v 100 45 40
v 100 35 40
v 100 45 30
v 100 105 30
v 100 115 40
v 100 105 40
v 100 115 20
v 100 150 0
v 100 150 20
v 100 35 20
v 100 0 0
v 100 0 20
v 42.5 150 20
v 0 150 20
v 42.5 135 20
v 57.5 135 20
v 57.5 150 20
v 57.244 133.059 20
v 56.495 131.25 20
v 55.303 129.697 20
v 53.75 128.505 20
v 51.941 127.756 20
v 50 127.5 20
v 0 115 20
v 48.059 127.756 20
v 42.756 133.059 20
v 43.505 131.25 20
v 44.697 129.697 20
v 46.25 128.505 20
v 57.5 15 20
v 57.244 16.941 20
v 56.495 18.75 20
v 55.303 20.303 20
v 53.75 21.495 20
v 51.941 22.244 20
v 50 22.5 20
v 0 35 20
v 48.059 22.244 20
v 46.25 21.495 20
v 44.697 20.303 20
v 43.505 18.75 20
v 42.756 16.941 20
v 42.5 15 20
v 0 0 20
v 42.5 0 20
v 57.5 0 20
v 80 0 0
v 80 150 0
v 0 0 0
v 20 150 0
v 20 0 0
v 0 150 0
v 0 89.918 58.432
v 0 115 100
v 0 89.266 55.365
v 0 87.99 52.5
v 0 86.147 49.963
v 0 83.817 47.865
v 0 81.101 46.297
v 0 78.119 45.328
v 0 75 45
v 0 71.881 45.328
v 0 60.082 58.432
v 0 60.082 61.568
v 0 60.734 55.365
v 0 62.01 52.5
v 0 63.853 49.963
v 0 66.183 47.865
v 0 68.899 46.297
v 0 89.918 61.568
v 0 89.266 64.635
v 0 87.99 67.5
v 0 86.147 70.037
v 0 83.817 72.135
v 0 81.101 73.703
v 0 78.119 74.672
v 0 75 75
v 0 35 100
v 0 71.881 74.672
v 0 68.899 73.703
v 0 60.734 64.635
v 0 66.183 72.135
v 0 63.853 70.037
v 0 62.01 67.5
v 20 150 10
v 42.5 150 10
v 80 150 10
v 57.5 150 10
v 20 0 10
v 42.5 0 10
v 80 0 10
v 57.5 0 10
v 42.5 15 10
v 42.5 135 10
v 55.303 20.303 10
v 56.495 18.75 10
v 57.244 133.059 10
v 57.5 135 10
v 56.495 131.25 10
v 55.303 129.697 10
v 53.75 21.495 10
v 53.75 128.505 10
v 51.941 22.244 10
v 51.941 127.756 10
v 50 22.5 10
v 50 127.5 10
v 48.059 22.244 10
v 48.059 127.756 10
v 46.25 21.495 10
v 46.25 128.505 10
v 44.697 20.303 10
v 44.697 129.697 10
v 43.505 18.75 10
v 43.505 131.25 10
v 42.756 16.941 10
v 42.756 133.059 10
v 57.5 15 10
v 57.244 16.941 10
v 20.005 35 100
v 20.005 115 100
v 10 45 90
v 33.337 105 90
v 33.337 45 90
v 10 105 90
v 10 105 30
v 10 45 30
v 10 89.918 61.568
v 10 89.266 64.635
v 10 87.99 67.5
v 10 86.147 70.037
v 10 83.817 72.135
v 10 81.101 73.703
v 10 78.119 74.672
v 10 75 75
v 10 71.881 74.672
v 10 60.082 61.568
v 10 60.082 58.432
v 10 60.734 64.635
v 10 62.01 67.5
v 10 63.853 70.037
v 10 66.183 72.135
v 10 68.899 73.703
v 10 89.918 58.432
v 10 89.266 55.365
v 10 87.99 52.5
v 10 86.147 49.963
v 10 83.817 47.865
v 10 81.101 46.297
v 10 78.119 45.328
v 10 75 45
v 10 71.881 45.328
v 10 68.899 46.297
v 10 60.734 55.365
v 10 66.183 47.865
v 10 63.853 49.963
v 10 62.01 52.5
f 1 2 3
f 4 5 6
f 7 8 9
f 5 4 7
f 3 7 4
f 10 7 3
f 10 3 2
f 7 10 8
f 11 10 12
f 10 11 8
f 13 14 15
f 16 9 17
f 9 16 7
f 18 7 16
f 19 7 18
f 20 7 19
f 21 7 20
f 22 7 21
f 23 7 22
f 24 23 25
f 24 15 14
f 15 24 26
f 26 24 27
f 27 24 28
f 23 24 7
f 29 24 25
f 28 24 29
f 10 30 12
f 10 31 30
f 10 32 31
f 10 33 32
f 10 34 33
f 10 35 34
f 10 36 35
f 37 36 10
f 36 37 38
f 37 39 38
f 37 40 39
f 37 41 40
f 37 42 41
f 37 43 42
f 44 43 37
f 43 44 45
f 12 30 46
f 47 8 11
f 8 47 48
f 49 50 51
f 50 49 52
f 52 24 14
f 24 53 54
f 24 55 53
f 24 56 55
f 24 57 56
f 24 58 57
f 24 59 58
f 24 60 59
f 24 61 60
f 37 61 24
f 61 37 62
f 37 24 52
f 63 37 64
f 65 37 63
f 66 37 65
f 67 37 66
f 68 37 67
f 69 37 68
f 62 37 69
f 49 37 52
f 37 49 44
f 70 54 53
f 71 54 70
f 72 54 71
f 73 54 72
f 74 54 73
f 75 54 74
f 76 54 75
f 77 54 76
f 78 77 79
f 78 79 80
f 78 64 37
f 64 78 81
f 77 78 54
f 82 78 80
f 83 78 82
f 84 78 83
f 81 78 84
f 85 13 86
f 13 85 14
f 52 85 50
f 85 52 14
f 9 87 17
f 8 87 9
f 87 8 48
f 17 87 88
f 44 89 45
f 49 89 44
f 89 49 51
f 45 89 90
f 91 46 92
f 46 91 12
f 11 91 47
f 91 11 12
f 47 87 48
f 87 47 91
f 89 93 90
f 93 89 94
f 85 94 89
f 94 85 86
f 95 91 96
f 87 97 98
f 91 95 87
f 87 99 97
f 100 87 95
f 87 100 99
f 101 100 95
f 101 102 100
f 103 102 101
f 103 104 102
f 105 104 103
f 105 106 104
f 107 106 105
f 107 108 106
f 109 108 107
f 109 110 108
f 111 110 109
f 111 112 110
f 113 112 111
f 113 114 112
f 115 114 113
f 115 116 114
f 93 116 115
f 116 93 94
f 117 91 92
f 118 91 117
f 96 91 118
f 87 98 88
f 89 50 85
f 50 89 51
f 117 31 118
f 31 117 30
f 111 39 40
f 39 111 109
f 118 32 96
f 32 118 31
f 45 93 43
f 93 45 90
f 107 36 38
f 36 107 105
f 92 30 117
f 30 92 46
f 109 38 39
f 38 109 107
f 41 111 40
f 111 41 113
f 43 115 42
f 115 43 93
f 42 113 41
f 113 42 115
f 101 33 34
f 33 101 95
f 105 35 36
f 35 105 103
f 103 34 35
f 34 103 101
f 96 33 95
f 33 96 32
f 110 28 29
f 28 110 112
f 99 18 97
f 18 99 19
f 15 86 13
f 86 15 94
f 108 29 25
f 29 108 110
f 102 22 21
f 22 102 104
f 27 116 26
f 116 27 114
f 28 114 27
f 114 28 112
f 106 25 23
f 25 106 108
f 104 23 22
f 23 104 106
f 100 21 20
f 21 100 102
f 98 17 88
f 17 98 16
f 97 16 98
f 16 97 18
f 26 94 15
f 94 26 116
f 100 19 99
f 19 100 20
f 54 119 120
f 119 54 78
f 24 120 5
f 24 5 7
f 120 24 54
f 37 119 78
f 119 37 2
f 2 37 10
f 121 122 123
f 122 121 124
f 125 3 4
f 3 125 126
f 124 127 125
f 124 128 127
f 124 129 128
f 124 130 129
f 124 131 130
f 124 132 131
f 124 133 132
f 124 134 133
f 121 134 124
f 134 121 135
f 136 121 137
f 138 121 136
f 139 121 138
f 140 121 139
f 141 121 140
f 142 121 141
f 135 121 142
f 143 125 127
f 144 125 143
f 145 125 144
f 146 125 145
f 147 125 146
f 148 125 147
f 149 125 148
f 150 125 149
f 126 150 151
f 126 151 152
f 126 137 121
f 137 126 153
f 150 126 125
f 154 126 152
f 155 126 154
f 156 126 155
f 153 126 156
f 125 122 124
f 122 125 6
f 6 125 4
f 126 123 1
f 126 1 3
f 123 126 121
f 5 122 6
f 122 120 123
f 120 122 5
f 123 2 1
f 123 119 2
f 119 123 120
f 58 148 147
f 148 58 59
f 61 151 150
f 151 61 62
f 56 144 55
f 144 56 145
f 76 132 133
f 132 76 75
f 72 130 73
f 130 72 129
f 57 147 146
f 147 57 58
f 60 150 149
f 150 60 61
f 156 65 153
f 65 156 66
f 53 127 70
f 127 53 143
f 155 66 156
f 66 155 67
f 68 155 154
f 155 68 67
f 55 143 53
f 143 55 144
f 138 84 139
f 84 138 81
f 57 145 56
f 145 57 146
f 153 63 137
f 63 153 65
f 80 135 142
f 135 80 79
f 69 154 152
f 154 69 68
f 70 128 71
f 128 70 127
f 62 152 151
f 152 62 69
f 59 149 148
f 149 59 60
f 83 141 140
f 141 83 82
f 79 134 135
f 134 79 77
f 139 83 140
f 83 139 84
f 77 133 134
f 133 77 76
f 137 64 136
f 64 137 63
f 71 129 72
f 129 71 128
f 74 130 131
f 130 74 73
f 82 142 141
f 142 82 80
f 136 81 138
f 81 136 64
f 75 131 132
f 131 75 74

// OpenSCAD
//-------------------------------------------------------------
//VARIABLE LIST BLOCK
    
//Base Rectangle postive object
baseRectLength = 150;
baseRectWidth = 100;
baseRectDepth = 20;

//Base Rectangle negitive object (cutting object)
baseRectLengthCut = 150;
baseRectWidthCut = 60;
baseRectDepthCut = 10;

//Mounting cutouts negative object (cutting object)
baseCircularRadiusCut = 7.50;
baseCircularCutLength = 15;
    //translation
    theXoffset = 20;

//The Mounting Cube
cubeWidth = 100;
cubeDepth = 80;
cubeHeight = 80;
    //cube translations
    cubeXoffset = 0;
    cubeYoffset = 35;
    cubeZoffset = 20;

//Mounting Cube Cuts
cubeWidthCut = 100;
cubeDepthCut = 60;
cubeHeightCut = 60;
    //cube translations Cuts
    cubeXoffsetCut = 10;
    cubeYoffsetCut = 45;
    cubeZoffsetCut = 30;

//Diaganol Cut
DiagcubeWidthCut = 100;
DiagcubeDepthCut = 80;
DiagcubeHeightCut = 110;
    //Diaganol Translations Cuts
    DiagXoffsetCut = 100;
    DiagYoffsetCut = 35;
    DiagZoffsetCut = 40;
    DiagCutAngle = -53.1285;

// hole cut
circularDiameterCut = 30;
circularDiameterDepthCut = 10;
    //hole cut Translations
    circularYoffsetCut = 75;
    circularZoffsetCut = 60;
//------------------------------------------------------------ 

//Parts


//------------------------------------------------------------
//THE BASE
difference(){
    cube([ baseRectWidth, baseRectLength, baseRectDepth]);
    
    translate([theXoffset, 0, 0])
    cube([ baseRectWidthCut, baseRectLengthCut, baseRectDepthCut]);
    
    
    hull(){
        translate([baseRectWidth / 2, baseCircularCutLength, 0])
        cylinder(baseRectDepth,r = baseCircularRadiusCut, false);
    
        translate([baseRectWidth / 2, 0, 0])
        cylinder(baseRectDepth,r = baseCircularRadiusCut, false);
        } 
        
        
    translate([0, baseRectLength, 0])
    hull(){
         translate([baseRectWidth / 2, -baseCircularCutLength, 0])
         cylinder(baseRectDepth,r = baseCircularRadiusCut, false);
        
         translate([baseRectWidth / 2, 0, 0])
         cylinder(baseRectDepth,r = baseCircularRadiusCut, false);
            }
}
//------------------------------------------------------------
//THETOP BLOCK
difference(){
    translate([cubeXoffset, cubeYoffset, cubeZoffset])
    cube([ cubeWidth, cubeDepth, cubeHeight]);

        translate([cubeXoffsetCut, cubeYoffsetCut, cubeZoffsetCut])
        cube([ cubeWidthCut, cubeDepthCut, cubeHeightCut]);

        translate([DiagXoffsetCut, DiagYoffsetCut, DiagZoffsetCut])
        rotate([0, DiagCutAngle , 0]) //the angle is more than likely wrong.
        cube([ DiagcubeWidthCut, DiagcubeDepthCut, DiagcubeHeightCut]);
    
        translate([ 0, circularYoffsetCut, circularZoffsetCut])
        rotate([0, 90, 0])
        cylinder(circularDiameterDepthCut, d = circularDiameterCut, false);
}
